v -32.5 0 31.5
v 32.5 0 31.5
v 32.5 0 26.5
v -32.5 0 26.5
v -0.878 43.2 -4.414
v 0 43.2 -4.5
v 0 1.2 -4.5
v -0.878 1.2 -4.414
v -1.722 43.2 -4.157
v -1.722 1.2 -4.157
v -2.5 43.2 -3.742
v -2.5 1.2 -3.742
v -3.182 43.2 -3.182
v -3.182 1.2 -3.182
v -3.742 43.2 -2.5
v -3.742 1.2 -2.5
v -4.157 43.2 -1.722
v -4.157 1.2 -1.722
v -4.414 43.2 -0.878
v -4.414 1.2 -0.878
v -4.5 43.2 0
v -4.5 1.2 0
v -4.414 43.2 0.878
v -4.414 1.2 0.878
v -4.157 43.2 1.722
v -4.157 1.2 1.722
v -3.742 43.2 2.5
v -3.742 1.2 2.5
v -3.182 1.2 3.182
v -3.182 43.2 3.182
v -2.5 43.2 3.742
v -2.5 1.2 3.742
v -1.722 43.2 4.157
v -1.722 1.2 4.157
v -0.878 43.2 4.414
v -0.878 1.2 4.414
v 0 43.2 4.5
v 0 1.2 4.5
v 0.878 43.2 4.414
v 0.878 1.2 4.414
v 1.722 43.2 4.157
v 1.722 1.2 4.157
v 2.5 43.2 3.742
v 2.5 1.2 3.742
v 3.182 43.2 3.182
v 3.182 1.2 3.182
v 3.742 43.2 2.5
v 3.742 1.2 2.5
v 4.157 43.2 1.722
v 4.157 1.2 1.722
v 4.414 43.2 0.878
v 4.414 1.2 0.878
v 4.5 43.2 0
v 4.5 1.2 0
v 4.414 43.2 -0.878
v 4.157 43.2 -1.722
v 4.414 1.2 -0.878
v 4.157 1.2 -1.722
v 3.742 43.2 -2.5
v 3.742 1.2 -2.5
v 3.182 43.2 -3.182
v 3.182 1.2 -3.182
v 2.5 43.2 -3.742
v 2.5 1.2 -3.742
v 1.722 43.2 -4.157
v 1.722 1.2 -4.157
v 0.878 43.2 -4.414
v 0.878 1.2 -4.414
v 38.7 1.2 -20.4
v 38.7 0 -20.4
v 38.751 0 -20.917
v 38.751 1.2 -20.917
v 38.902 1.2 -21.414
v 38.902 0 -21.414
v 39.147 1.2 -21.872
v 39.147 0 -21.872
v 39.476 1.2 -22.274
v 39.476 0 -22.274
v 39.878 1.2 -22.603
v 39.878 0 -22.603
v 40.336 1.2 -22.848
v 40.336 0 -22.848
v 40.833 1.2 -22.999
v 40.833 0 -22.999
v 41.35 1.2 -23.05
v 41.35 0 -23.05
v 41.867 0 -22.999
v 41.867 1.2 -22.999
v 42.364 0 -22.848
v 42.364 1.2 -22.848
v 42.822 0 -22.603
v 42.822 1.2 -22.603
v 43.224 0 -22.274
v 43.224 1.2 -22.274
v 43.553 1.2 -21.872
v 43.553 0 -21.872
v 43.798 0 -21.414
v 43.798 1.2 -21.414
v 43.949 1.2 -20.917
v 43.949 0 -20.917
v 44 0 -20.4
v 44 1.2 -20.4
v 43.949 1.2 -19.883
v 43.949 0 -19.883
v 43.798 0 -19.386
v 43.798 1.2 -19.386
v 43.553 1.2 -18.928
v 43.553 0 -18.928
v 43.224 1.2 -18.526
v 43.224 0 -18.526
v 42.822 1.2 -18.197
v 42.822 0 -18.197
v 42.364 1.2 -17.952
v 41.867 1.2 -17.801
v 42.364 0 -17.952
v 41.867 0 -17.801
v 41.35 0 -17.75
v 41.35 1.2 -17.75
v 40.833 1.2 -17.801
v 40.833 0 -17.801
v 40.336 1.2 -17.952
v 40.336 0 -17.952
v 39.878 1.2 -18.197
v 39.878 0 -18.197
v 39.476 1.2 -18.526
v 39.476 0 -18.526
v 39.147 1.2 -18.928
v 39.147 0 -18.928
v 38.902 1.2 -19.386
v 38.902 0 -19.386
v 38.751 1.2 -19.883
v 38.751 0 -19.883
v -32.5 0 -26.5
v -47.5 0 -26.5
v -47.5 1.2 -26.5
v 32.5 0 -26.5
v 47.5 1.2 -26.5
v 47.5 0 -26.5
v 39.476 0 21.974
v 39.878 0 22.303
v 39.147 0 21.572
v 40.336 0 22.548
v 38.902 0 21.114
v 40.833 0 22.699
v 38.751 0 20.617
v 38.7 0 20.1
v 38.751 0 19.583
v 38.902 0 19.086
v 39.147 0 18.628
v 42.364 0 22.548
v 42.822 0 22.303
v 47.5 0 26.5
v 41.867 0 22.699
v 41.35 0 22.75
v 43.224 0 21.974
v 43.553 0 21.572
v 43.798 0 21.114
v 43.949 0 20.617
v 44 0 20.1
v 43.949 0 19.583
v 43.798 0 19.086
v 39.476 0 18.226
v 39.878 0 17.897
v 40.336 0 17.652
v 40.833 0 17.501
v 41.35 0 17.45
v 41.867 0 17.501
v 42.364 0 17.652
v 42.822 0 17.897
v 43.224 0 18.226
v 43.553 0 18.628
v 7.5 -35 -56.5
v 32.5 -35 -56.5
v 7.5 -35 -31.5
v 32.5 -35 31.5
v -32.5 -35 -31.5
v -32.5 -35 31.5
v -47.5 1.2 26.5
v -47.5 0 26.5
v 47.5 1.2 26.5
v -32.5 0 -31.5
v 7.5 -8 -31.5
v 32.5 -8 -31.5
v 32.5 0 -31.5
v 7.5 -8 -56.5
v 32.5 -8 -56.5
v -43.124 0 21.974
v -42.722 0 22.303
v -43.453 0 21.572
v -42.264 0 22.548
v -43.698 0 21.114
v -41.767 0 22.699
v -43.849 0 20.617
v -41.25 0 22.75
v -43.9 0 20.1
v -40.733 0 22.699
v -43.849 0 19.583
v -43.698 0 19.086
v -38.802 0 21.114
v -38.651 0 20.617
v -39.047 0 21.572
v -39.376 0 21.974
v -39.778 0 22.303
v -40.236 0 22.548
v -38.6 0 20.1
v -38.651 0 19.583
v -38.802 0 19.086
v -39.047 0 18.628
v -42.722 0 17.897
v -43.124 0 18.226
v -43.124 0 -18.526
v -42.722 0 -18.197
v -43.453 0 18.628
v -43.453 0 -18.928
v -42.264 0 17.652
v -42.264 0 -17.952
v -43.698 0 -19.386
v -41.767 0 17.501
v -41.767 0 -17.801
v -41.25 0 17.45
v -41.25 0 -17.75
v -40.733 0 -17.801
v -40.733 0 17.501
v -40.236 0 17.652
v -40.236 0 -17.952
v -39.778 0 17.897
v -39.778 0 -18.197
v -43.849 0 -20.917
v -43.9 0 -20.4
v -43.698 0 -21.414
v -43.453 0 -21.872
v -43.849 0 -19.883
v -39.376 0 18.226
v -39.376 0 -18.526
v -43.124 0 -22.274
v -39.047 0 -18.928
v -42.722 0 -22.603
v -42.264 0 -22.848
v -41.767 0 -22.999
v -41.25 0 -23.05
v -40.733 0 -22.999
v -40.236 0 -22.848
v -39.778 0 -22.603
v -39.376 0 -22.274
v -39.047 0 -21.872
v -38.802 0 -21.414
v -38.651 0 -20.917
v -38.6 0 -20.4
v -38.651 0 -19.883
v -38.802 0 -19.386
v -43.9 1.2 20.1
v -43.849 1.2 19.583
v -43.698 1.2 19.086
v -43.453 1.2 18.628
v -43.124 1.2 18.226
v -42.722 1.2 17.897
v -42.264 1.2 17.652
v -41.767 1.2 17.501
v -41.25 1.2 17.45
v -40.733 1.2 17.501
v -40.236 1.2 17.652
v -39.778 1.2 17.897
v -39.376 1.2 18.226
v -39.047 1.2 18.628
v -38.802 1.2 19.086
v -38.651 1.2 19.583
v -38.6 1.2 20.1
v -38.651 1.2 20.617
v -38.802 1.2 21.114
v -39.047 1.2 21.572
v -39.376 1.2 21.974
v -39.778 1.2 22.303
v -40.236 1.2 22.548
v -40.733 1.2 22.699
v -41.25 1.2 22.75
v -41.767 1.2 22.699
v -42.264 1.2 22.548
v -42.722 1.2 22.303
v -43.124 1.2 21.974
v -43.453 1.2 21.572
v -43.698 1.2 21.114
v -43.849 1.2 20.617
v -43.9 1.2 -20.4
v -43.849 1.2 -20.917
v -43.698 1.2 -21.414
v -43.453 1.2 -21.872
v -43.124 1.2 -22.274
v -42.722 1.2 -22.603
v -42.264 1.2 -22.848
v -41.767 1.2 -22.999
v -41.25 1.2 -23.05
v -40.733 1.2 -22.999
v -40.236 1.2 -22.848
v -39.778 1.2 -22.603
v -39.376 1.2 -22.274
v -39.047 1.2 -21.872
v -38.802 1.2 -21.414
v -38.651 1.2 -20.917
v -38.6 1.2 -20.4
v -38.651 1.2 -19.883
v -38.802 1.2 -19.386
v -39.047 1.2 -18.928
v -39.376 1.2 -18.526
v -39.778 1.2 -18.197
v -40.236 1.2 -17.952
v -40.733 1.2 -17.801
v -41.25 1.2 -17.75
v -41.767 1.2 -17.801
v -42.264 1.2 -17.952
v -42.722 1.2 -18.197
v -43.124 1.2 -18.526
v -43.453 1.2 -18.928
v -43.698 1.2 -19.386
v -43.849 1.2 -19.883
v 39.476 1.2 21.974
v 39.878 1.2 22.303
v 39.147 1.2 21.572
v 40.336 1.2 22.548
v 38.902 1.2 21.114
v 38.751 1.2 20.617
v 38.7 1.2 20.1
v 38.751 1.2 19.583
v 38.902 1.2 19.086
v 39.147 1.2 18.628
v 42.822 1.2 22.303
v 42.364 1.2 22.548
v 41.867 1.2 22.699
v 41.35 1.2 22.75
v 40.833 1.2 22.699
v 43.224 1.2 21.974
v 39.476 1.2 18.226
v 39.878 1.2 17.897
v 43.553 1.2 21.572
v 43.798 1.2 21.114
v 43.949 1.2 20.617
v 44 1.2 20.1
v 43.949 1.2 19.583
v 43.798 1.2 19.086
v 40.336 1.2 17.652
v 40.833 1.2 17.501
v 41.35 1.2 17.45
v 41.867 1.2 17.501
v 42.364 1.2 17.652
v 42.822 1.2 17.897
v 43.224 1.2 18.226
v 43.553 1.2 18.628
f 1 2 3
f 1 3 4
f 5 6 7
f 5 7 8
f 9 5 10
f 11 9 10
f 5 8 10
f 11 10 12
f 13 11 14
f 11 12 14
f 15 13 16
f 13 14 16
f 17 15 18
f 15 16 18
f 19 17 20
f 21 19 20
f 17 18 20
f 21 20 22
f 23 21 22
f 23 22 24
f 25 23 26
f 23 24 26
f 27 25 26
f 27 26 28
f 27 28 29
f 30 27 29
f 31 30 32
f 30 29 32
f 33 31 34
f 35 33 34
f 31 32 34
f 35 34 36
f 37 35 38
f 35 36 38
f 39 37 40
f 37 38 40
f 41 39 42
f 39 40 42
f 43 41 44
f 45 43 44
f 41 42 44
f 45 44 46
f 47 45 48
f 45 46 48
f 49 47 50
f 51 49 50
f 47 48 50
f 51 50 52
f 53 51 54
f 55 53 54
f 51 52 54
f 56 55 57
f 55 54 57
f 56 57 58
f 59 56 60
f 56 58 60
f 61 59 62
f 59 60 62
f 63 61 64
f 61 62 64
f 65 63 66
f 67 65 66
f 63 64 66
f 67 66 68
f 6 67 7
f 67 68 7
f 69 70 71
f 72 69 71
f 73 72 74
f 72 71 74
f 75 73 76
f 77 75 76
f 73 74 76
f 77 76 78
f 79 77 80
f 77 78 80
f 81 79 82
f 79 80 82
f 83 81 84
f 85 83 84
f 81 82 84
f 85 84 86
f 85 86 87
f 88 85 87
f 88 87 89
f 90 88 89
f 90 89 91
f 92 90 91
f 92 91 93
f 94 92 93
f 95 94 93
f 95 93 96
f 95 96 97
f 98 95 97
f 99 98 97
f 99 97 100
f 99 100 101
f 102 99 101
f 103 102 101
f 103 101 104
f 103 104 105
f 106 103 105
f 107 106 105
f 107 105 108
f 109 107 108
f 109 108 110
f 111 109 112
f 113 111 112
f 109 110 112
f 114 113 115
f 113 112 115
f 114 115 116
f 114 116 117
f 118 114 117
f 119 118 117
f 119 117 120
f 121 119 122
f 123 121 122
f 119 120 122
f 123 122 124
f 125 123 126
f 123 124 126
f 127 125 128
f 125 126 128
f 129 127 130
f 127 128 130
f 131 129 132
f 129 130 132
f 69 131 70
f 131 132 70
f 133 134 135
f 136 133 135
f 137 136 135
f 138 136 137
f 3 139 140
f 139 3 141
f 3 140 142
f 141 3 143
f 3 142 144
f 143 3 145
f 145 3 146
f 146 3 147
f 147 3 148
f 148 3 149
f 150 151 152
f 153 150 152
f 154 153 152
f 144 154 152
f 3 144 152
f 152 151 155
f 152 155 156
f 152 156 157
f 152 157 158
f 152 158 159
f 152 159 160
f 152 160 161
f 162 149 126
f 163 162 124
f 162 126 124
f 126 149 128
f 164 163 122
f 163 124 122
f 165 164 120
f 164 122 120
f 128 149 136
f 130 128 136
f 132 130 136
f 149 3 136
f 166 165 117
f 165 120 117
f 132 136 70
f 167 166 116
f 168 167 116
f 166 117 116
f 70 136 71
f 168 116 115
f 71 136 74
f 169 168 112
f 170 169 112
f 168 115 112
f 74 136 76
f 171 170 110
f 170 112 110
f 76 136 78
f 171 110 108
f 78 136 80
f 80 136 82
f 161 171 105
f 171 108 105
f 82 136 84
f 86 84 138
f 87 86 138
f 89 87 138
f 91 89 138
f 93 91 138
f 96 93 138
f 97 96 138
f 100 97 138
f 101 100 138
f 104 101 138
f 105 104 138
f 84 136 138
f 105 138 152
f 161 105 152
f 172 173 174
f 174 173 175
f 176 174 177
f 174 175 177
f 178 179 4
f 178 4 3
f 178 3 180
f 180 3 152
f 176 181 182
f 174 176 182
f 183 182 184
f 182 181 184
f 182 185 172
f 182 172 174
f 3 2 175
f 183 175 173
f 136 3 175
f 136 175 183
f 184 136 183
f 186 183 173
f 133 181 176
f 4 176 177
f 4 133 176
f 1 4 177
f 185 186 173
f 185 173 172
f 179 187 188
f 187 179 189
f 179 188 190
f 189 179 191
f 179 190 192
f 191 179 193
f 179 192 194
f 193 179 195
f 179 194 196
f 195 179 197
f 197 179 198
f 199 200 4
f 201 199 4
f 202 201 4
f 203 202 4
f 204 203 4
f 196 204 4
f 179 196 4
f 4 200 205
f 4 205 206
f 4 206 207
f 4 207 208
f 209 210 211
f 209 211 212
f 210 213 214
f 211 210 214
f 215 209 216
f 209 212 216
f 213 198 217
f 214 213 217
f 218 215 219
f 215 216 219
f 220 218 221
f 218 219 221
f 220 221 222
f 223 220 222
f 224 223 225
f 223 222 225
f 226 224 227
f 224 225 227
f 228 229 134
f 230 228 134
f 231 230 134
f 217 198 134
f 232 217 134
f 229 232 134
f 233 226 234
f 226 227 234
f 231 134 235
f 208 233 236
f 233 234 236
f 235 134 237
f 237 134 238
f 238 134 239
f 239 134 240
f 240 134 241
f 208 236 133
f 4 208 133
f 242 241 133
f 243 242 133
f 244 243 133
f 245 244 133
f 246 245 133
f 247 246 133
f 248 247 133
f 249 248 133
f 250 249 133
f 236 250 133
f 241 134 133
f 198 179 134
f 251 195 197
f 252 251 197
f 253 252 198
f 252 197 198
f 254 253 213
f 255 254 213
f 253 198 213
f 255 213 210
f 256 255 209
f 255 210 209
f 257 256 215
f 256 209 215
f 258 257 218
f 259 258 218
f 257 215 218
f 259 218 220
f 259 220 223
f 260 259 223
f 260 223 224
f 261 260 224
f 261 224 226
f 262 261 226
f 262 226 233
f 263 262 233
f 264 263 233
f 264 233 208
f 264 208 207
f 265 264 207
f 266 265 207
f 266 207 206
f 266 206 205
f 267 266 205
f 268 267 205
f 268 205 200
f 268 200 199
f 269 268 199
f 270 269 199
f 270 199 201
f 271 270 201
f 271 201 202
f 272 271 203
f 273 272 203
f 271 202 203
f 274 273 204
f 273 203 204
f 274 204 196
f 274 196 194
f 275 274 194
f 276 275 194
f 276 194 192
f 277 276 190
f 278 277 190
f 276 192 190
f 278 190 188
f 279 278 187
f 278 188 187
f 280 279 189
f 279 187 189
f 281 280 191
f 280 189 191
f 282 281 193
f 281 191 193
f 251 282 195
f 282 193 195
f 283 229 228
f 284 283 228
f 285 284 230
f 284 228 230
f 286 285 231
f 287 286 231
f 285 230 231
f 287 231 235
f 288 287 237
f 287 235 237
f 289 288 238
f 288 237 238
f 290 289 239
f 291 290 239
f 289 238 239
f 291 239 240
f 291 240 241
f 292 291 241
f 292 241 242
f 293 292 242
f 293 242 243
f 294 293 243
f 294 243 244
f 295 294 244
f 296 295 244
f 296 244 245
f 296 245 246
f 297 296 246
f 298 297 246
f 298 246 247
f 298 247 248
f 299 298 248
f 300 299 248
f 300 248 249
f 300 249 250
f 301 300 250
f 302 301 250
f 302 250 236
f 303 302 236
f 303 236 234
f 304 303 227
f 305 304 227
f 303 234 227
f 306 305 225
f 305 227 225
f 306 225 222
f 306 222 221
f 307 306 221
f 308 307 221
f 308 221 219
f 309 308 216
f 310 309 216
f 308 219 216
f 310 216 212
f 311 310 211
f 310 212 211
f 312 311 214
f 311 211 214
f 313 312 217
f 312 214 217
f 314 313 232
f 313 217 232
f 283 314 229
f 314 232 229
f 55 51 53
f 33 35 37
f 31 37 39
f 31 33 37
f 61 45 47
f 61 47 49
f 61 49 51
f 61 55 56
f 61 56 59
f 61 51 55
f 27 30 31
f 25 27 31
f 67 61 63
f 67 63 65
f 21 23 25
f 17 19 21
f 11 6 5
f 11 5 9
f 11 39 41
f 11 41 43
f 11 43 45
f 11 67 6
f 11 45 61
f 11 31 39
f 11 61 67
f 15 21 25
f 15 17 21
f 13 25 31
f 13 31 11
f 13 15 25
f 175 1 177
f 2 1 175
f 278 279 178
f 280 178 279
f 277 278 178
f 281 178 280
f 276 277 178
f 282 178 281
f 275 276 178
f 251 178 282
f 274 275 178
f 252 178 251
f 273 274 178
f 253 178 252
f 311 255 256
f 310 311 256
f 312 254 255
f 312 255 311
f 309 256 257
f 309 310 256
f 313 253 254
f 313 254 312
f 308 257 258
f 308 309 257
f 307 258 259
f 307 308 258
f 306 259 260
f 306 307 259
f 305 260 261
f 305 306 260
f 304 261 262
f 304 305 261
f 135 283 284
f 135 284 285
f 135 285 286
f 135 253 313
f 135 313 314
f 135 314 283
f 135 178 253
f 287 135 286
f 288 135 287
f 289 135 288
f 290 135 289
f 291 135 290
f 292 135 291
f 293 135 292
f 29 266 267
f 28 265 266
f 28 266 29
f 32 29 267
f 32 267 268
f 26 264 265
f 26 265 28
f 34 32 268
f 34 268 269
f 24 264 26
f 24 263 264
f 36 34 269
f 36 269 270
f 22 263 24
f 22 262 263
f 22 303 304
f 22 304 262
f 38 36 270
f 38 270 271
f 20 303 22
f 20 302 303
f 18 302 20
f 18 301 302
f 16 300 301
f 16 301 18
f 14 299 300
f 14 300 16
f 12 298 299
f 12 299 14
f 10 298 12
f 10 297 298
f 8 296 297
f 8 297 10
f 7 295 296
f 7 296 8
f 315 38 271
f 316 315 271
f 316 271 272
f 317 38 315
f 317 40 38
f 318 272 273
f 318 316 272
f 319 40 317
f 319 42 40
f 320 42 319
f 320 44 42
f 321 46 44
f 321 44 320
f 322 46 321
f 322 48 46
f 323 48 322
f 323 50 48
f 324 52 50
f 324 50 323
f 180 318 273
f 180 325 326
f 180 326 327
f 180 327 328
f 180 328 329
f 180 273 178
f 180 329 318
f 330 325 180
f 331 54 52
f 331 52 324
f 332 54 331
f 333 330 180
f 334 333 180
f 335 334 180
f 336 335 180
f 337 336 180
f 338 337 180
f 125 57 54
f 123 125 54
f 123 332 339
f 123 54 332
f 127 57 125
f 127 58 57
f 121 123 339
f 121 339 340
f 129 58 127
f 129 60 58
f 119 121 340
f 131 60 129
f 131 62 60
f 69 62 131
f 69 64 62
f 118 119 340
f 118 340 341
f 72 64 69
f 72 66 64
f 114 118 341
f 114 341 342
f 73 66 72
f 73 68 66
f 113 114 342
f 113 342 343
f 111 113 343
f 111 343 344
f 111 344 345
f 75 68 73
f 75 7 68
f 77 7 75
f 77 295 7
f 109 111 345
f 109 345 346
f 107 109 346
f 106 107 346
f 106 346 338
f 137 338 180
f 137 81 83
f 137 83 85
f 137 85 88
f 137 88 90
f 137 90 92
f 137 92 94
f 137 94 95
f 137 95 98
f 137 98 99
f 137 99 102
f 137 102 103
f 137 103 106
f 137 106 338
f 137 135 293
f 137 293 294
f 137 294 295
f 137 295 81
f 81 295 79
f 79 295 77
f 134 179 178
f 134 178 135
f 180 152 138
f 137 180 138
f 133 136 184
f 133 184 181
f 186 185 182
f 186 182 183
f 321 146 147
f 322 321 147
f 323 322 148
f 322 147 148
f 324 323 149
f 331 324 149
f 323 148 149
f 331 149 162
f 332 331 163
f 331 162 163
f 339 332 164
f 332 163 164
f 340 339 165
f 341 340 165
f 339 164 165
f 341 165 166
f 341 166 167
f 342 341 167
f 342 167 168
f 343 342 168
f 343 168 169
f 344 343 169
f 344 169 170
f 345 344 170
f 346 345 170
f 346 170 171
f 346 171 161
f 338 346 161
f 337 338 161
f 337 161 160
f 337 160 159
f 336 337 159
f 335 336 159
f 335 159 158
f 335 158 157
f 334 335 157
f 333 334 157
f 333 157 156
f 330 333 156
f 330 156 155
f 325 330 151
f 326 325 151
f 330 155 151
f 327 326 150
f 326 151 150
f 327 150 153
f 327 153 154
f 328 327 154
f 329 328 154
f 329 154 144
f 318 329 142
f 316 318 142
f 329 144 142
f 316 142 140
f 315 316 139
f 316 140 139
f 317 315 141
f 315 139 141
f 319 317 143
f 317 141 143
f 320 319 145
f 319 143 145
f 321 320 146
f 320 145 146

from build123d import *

# Parameters (mm, degrees)
SKETCH_1_W          = 95
SKETCH_1_H          = 53
EXTRUDE_282_DEPTH   = 1.2
EXTRUDE_686_DEPTH   = 35
SKETCH_10_W         = 25
SKETCH_10_H         = 25
CUT_EXTRUDE_1_DEPTH = 8
SKETCH_7_R          = 4.5
EXTRUDE_1043_DEPTH  = 42
HOLE_WIZARD_M5_1_D  = 5.3


with BuildPart() as part:
    # 草图1 → Extrude 282 (new body)
    with BuildSketch(Plane(origin=(0, 0, 0), x_dir=(1, 0, 0), z_dir=(0, 1, 0))):
        Rectangle(SKETCH_1_W, SKETCH_1_H)
    extrude(amount=EXTRUDE_282_DEPTH)

    # 草图6 → Extrude 686 (add)
    with BuildSketch(Plane.XZ):
        Polygon((32.5, -56.5), (7.5, -56.5), (7.5, -31.5), (-32.5, -31.5), (-32.5, 31.5), (32.5, 31.5), align=None)
    extrude(amount=EXTRUDE_686_DEPTH)

    # 草图10 → 切除-拉伸1 (cut)
    with BuildSketch(Plane(origin=(0, 0, 0), x_dir=(1, 0, 0), z_dir=(0, 1, 0))):
        with Locations((20, 44)):
            Rectangle(SKETCH_10_W, SKETCH_10_H)
    extrude(amount=-CUT_EXTRUDE_1_DEPTH, mode=Mode.SUBTRACT)

    # 草图7 → Extrude 1043 (add)
    with BuildSketch(Plane(origin=(0, 1.2, 0), x_dir=(1, 0, 0), z_dir=(0, 1, 0))):
        with Locations(Location((0, 0, 0), (0, 0, 90))):
            Circle(SKETCH_7_R)
    extrude(amount=EXTRUDE_1043_DEPTH)

    # M5 间隙孔1 (through all)
    with Locations(Plane(origin=(0, 1.2, 0), x_dir=(1, 0, 0), z_dir=(0, 1, 0))):
        with Locations((-41.25, 20.4), (-41.25, -20.1), (41.35, -20.1), (41.35, 20.4)):
            Hole(HOLE_WIZARD_M5_1_D / 2)


solid = part.part
